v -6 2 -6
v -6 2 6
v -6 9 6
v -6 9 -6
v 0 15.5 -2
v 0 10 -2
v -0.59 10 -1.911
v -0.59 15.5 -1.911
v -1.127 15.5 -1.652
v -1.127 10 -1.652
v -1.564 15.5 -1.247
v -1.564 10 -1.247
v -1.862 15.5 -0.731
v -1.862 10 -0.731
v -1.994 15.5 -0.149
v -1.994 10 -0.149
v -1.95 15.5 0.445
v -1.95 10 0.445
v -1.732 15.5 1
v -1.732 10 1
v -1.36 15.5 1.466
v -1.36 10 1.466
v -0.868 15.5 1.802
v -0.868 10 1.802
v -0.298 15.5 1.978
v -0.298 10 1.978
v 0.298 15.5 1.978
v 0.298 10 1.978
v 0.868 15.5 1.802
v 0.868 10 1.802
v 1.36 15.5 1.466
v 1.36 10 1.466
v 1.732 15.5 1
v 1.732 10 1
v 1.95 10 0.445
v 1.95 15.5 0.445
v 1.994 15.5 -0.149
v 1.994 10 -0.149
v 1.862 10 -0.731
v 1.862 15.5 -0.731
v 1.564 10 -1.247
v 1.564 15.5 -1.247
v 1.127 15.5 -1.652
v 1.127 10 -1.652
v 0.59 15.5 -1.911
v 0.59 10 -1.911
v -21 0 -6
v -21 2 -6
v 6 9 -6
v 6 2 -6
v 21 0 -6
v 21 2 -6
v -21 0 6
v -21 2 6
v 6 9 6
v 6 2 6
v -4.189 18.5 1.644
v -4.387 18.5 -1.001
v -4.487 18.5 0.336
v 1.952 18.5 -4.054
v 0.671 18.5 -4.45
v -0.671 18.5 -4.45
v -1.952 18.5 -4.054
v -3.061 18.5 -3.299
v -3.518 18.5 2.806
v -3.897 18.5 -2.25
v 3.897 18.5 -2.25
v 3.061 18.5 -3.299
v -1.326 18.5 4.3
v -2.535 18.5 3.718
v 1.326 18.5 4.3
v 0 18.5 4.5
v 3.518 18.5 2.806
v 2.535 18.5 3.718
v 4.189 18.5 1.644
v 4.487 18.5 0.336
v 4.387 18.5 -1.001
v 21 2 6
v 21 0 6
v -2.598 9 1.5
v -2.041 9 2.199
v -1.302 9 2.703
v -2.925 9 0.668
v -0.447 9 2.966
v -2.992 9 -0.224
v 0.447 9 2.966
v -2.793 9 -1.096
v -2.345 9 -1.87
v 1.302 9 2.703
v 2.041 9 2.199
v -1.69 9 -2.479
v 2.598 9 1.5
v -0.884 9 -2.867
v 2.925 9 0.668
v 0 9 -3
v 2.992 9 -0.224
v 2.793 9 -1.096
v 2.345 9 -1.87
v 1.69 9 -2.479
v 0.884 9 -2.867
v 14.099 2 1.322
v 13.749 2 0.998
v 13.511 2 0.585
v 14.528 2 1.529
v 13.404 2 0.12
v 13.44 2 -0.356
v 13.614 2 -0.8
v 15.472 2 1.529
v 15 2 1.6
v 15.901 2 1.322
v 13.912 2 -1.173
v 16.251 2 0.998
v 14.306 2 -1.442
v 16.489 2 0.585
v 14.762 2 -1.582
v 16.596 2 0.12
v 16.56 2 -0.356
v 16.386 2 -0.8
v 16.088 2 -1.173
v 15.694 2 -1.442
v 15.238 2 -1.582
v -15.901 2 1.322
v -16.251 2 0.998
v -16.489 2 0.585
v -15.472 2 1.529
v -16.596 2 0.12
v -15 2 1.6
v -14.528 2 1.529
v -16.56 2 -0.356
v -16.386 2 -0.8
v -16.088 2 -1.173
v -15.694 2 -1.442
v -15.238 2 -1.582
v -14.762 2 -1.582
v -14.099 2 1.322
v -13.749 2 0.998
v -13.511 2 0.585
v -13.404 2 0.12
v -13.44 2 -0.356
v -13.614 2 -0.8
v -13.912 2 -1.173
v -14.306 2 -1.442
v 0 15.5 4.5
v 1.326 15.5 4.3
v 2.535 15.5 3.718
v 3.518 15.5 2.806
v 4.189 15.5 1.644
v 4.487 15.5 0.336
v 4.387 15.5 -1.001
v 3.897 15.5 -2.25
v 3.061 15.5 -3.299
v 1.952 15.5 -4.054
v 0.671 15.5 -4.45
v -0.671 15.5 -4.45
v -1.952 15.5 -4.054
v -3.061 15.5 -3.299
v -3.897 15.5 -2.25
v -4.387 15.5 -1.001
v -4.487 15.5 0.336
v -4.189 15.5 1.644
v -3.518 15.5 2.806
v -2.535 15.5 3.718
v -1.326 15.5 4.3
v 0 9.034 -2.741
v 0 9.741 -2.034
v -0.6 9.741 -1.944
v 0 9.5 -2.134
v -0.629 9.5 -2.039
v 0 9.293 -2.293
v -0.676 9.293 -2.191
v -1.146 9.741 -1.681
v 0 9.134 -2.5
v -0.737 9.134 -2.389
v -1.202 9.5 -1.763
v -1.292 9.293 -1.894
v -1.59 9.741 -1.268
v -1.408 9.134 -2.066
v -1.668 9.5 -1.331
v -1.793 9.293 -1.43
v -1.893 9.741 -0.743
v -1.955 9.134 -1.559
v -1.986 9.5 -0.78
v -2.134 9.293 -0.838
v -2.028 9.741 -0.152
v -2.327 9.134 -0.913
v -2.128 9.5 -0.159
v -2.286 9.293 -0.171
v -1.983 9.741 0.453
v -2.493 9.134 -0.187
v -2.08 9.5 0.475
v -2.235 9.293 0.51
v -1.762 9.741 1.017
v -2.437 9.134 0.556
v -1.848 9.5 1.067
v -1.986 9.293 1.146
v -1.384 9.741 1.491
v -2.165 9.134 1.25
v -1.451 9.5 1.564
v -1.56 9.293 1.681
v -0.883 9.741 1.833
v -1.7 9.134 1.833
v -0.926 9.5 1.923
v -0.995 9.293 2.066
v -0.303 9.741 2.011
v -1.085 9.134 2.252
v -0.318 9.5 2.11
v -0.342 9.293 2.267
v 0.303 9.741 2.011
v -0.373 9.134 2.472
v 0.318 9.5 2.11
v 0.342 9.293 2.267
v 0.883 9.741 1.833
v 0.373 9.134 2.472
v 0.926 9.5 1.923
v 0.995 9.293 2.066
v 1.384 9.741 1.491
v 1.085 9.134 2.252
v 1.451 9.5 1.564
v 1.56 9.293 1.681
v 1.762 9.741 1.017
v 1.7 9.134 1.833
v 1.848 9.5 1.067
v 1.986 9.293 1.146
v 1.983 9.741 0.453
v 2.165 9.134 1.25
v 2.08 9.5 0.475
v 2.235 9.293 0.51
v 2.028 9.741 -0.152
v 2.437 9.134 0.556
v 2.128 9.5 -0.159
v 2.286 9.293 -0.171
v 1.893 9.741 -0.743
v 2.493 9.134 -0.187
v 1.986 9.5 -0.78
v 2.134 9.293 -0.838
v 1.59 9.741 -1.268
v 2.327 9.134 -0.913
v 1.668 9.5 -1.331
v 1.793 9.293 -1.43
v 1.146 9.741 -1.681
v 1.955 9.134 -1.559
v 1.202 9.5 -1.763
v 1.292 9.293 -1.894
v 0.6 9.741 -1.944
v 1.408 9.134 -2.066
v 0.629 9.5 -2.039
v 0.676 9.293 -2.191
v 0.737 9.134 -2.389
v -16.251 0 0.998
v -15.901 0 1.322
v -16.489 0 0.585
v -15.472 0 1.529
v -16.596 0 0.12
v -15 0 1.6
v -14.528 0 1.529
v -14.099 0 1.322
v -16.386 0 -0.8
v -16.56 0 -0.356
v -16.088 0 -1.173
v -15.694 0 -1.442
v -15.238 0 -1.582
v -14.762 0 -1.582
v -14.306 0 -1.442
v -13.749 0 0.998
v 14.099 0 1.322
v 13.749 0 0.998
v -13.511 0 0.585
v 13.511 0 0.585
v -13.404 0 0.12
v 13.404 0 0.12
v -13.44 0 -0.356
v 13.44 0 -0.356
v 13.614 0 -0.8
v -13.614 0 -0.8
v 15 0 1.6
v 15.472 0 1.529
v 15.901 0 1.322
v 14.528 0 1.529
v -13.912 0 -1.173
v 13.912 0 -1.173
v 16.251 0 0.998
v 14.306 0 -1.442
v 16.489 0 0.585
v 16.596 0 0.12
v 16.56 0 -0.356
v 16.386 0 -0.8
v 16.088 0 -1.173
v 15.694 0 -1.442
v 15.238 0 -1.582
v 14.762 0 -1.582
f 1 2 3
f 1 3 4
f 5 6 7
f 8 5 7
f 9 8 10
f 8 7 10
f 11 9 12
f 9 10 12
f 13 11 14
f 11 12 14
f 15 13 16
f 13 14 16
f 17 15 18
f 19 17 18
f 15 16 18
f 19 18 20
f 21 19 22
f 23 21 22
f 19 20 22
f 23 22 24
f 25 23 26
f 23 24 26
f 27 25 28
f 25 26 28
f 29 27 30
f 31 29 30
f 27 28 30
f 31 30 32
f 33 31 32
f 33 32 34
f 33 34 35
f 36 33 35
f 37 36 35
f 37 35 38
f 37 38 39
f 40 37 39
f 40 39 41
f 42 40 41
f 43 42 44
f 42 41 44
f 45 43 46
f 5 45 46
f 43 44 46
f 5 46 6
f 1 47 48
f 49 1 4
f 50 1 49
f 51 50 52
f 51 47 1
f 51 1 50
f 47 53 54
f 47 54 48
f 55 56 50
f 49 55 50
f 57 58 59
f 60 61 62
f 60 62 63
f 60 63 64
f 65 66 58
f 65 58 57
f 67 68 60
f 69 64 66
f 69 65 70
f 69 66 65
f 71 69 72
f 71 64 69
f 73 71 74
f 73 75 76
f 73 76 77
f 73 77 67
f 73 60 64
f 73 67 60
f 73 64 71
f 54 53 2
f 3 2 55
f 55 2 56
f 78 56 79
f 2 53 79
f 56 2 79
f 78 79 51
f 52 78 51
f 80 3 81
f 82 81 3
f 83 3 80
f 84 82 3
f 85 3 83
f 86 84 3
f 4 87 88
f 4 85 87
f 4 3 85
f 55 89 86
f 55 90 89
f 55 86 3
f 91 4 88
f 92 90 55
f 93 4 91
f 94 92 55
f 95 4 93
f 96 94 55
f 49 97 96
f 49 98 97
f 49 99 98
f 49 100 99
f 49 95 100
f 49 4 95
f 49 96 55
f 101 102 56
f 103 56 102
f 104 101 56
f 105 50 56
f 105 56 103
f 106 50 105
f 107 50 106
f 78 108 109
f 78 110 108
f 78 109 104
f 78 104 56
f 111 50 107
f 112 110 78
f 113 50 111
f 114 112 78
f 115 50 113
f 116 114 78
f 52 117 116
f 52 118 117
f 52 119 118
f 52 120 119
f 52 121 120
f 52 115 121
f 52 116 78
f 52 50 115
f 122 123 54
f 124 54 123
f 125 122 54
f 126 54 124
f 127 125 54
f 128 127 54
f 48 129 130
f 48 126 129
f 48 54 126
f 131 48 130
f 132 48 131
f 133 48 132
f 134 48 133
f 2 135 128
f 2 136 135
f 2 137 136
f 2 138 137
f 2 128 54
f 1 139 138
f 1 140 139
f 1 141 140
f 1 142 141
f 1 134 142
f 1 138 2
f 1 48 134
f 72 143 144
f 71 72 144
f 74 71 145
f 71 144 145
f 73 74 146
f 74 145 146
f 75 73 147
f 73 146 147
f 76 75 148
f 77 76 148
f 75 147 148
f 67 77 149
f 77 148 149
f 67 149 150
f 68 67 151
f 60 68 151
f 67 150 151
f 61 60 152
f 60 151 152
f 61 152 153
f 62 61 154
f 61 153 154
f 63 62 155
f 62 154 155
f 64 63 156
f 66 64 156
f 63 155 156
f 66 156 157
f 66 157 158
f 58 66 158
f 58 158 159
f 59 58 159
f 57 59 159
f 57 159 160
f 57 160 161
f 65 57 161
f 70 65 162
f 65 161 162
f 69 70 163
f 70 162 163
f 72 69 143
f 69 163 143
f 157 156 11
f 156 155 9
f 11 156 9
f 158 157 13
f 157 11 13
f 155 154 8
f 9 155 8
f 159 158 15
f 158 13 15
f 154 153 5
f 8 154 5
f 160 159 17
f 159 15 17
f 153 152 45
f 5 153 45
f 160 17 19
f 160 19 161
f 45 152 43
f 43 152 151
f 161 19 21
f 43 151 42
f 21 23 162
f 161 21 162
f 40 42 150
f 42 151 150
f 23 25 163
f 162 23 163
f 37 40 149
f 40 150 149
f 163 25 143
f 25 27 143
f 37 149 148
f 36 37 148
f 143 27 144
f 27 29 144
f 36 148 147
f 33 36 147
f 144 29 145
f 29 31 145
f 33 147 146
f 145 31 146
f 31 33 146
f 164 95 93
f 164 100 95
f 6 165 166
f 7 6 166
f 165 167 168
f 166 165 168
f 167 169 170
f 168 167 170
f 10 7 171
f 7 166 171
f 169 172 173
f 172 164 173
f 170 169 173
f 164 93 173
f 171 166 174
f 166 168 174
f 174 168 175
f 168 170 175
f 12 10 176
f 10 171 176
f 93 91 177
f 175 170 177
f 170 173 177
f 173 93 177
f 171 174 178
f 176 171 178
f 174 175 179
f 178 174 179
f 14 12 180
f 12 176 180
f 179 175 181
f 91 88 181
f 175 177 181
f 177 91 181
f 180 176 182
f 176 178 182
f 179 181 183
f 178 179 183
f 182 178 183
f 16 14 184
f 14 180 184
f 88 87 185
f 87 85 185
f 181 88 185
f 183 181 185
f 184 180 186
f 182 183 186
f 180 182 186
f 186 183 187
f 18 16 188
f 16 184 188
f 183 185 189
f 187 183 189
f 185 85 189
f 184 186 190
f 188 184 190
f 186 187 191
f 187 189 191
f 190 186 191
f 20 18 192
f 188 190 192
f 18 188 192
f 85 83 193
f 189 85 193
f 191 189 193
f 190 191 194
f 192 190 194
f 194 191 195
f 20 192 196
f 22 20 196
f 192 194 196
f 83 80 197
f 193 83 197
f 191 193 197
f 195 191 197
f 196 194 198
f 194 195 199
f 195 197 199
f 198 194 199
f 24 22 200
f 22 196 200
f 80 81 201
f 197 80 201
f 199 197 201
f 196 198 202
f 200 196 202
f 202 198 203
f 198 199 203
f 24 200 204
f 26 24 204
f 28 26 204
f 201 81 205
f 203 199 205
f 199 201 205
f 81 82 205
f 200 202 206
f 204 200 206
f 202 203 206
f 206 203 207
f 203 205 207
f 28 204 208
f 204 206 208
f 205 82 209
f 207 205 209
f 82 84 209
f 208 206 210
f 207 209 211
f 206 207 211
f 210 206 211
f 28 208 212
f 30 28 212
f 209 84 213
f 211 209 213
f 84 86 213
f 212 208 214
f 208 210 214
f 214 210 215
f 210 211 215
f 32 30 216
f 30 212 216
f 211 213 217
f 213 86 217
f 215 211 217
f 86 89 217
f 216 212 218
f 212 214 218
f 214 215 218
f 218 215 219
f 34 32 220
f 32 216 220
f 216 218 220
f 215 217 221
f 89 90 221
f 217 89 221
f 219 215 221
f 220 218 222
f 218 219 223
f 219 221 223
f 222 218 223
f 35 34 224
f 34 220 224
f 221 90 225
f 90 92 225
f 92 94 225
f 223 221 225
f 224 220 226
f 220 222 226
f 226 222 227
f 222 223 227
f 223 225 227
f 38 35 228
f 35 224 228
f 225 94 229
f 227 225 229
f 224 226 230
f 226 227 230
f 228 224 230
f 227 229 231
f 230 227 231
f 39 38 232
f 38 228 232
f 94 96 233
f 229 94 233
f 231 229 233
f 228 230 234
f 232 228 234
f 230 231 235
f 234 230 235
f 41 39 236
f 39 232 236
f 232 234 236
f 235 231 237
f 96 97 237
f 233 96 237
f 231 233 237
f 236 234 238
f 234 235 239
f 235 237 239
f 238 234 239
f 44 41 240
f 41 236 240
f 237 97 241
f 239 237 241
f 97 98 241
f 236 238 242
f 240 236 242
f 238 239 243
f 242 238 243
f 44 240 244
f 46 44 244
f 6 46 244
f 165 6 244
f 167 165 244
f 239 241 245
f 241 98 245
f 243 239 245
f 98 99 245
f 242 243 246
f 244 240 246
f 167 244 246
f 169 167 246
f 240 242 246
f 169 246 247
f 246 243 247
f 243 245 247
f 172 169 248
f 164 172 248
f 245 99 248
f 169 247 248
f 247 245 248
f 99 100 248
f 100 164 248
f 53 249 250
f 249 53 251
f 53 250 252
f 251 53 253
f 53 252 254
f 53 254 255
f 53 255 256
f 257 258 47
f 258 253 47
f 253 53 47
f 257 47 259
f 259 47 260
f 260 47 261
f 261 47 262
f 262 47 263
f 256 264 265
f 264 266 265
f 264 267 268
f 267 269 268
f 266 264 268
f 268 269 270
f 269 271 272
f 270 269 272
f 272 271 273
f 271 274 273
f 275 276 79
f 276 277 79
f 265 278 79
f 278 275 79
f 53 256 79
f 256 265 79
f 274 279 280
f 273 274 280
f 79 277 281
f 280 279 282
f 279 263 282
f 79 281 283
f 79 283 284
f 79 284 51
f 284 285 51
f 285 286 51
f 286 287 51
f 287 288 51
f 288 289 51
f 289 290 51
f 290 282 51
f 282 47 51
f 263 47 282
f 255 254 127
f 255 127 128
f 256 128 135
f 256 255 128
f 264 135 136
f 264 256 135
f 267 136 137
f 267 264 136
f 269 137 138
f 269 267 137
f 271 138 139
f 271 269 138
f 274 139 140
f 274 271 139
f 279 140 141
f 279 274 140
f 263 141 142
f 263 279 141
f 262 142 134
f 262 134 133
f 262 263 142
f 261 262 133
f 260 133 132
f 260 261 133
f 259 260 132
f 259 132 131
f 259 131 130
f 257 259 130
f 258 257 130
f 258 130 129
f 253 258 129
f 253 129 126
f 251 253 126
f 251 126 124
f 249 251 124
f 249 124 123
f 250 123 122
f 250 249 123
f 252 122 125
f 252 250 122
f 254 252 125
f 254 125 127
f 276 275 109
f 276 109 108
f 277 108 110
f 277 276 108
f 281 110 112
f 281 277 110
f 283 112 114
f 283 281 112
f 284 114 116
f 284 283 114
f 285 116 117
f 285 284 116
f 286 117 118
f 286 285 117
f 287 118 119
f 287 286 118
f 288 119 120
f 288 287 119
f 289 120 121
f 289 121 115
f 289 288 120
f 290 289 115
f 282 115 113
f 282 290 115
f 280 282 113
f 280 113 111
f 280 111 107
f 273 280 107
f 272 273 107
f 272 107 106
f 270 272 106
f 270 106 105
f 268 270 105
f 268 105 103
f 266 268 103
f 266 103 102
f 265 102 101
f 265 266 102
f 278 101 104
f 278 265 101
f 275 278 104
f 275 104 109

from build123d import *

# Parameters (mm, degrees)
CROQUIS1_W              = 42
CROQUIS1_H              = 12
CROQUIS1_R              = 1.6
SALIENTE_EXTRUIR1_DEPTH = 2
CROQUIS2_W              = 12
CROQUIS2_H              = 12
SALIENTE_EXTRUIR2_DEPTH = 7
CROQUIS3_R              = 2
SALIENTE_EXTRUIR3_DEPTH = 6.5
CROQUIS4_R              = 4.5
SALIENTE_EXTRUIR4_DEPTH = 3
REDONDEO1_R             = 1


with BuildPart() as part:
    # Croquis1 → Saliente-Extruir1 (new body)
    with BuildSketch(Plane(origin=(0, 0, 0), x_dir=(1, 0, 0), z_dir=(0, 1, 0))):
        Rectangle(CROQUIS1_W, CROQUIS1_H)
        with Locations(Location((-15, 0, 0), (0, 0, 270))):
            Circle(CROQUIS1_R, mode=Mode.SUBTRACT)
        with Locations(Location((15, 0, 0), (0, 0, 270))):
            Circle(CROQUIS1_R, mode=Mode.SUBTRACT)
    extrude(amount=SALIENTE_EXTRUIR1_DEPTH)

    # Croquis2 → Saliente-Extruir2 (add)
    with BuildSketch(Plane(origin=(0, 2, 0), x_dir=(1, 0, 0), z_dir=(0, 1, 0))):
        Rectangle(CROQUIS2_W, CROQUIS2_H)
    extrude(amount=SALIENTE_EXTRUIR2_DEPTH)

    # Croquis3 → Saliente-Extruir3 (add)
    with BuildSketch(Plane(origin=(0, 9, 0), x_dir=(1, 0, 0), z_dir=(0, 1, 0))):
        with Locations(Location((0, 0, 0), (0, 0, 90))):
            Circle(CROQUIS3_R)
    extrude(amount=SALIENTE_EXTRUIR3_DEPTH)

    # Croquis4 → Saliente-Extruir4 (add)
    with BuildSketch(Plane(origin=(0, 15.5, 0), x_dir=(1, 0, 0), z_dir=(0, 1, 0))):
        with Locations(Location((0, 0, 0), (0, 0, 270))):
            Circle(CROQUIS4_R)
    extrude(amount=SALIENTE_EXTRUIR4_DEPTH)

    # Redondeo1
    redondeo1_edges = [part.edges().sort_by_distance(p)[0] for p in [
        (0, 9, 2),
    ]]
    fillet(redondeo1_edges, radius=REDONDEO1_R)


solid = part.part
